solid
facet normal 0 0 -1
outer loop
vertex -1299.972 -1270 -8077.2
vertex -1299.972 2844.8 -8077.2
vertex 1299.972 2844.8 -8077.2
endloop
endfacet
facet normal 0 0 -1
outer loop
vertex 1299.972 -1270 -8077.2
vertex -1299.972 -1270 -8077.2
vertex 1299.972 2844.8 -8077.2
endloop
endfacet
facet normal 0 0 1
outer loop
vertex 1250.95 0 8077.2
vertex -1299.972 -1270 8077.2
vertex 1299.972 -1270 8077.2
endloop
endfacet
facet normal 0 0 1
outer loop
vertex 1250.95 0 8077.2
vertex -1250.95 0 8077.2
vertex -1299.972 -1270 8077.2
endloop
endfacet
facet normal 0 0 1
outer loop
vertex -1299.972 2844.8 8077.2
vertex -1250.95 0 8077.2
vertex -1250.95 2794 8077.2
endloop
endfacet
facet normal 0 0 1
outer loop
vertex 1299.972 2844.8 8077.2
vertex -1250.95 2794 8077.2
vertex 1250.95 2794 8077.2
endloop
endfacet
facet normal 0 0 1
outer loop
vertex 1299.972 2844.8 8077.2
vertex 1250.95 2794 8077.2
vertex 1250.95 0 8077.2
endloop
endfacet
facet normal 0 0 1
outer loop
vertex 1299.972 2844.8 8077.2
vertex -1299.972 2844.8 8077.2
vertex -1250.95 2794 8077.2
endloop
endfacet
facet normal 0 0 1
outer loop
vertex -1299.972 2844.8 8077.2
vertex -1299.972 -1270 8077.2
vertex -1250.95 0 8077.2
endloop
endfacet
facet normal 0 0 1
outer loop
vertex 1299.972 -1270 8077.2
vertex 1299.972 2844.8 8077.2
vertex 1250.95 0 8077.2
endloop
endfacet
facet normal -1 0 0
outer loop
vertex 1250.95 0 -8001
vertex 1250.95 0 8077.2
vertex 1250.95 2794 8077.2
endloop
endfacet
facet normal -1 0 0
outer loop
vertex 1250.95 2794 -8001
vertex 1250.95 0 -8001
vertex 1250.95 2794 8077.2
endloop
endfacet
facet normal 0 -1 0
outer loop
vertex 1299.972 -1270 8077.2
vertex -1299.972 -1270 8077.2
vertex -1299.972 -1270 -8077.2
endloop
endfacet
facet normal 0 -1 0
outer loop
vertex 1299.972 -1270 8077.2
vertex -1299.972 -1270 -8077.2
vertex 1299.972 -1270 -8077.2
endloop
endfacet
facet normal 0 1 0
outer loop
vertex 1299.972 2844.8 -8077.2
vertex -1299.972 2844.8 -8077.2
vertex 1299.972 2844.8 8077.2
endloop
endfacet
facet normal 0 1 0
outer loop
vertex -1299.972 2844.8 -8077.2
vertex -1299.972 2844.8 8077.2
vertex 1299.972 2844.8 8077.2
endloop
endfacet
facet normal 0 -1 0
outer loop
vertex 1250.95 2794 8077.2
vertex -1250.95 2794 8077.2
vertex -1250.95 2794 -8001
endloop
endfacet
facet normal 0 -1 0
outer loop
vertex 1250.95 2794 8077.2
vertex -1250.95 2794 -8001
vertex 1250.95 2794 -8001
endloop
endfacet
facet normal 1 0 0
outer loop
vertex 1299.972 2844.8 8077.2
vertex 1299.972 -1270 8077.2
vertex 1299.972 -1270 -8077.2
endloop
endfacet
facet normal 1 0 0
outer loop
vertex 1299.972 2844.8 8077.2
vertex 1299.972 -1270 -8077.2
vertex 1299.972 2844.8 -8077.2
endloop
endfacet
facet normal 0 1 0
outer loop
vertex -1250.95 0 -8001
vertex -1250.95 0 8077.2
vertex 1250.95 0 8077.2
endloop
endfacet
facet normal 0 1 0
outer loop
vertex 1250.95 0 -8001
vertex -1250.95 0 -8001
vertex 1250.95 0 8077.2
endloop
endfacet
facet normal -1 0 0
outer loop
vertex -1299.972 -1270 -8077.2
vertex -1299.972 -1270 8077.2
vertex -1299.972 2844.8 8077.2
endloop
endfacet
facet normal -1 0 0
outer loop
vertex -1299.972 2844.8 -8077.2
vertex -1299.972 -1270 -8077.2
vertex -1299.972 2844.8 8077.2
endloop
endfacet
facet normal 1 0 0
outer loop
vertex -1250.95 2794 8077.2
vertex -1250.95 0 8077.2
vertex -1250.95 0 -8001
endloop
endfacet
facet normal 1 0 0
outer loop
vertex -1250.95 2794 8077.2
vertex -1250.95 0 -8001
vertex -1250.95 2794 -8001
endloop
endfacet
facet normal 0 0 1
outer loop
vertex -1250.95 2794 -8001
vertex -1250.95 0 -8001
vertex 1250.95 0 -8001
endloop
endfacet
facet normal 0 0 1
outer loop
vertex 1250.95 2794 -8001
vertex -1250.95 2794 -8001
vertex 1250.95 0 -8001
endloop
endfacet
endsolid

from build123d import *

# Parameters (mm, degrees)
SKETCH1_W      = 2599.944
SKETCH1_H      = 4114.8
EXTERIOR_DEPTH = 8077.2
SKETCH1_4_W    = 2501.9
SKETCH1_4_H    = 2794
INTERIOR_DEPTH = 8001
OPENING_REACH  = 16456.405
SKETCH3_W      = 2501.9
SKETCH3_H      = 2794


with BuildPart() as part:
    # Sketch1 → exterior (new, symmetric)
    with BuildSketch(Plane.XY):
        with Locations((0, 787.4)):
            Rectangle(SKETCH1_W, SKETCH1_H)
    extrude(amount=EXTERIOR_DEPTH, both=True)

    # Sketch1<4> → interior (cut, symmetric)
    with BuildSketch(Plane.XY):
        with Locations((0, 1397)):
            Rectangle(SKETCH1_4_W, SKETCH1_4_H)
    extrude(amount=INTERIOR_DEPTH, both=True, mode=Mode.SUBTRACT)

    # Sketch3 → opening (cut, up to next)
    with BuildSketch(Plane.XY.offset(8077.2), mode=Mode.PRIVATE) as opening_sk1:
        with Locations((0, 1397)):
            Rectangle(SKETCH3_W, SKETCH3_H)
    opening_tool1 = extrude(opening_sk1.sketch, amount=-OPENING_REACH, mode=Mode.PRIVATE) & part.part
    add(opening_tool1.solids().sort_by_distance((0, 1397, 8077.2))[0], mode=Mode.SUBTRACT)


solid = part.part
